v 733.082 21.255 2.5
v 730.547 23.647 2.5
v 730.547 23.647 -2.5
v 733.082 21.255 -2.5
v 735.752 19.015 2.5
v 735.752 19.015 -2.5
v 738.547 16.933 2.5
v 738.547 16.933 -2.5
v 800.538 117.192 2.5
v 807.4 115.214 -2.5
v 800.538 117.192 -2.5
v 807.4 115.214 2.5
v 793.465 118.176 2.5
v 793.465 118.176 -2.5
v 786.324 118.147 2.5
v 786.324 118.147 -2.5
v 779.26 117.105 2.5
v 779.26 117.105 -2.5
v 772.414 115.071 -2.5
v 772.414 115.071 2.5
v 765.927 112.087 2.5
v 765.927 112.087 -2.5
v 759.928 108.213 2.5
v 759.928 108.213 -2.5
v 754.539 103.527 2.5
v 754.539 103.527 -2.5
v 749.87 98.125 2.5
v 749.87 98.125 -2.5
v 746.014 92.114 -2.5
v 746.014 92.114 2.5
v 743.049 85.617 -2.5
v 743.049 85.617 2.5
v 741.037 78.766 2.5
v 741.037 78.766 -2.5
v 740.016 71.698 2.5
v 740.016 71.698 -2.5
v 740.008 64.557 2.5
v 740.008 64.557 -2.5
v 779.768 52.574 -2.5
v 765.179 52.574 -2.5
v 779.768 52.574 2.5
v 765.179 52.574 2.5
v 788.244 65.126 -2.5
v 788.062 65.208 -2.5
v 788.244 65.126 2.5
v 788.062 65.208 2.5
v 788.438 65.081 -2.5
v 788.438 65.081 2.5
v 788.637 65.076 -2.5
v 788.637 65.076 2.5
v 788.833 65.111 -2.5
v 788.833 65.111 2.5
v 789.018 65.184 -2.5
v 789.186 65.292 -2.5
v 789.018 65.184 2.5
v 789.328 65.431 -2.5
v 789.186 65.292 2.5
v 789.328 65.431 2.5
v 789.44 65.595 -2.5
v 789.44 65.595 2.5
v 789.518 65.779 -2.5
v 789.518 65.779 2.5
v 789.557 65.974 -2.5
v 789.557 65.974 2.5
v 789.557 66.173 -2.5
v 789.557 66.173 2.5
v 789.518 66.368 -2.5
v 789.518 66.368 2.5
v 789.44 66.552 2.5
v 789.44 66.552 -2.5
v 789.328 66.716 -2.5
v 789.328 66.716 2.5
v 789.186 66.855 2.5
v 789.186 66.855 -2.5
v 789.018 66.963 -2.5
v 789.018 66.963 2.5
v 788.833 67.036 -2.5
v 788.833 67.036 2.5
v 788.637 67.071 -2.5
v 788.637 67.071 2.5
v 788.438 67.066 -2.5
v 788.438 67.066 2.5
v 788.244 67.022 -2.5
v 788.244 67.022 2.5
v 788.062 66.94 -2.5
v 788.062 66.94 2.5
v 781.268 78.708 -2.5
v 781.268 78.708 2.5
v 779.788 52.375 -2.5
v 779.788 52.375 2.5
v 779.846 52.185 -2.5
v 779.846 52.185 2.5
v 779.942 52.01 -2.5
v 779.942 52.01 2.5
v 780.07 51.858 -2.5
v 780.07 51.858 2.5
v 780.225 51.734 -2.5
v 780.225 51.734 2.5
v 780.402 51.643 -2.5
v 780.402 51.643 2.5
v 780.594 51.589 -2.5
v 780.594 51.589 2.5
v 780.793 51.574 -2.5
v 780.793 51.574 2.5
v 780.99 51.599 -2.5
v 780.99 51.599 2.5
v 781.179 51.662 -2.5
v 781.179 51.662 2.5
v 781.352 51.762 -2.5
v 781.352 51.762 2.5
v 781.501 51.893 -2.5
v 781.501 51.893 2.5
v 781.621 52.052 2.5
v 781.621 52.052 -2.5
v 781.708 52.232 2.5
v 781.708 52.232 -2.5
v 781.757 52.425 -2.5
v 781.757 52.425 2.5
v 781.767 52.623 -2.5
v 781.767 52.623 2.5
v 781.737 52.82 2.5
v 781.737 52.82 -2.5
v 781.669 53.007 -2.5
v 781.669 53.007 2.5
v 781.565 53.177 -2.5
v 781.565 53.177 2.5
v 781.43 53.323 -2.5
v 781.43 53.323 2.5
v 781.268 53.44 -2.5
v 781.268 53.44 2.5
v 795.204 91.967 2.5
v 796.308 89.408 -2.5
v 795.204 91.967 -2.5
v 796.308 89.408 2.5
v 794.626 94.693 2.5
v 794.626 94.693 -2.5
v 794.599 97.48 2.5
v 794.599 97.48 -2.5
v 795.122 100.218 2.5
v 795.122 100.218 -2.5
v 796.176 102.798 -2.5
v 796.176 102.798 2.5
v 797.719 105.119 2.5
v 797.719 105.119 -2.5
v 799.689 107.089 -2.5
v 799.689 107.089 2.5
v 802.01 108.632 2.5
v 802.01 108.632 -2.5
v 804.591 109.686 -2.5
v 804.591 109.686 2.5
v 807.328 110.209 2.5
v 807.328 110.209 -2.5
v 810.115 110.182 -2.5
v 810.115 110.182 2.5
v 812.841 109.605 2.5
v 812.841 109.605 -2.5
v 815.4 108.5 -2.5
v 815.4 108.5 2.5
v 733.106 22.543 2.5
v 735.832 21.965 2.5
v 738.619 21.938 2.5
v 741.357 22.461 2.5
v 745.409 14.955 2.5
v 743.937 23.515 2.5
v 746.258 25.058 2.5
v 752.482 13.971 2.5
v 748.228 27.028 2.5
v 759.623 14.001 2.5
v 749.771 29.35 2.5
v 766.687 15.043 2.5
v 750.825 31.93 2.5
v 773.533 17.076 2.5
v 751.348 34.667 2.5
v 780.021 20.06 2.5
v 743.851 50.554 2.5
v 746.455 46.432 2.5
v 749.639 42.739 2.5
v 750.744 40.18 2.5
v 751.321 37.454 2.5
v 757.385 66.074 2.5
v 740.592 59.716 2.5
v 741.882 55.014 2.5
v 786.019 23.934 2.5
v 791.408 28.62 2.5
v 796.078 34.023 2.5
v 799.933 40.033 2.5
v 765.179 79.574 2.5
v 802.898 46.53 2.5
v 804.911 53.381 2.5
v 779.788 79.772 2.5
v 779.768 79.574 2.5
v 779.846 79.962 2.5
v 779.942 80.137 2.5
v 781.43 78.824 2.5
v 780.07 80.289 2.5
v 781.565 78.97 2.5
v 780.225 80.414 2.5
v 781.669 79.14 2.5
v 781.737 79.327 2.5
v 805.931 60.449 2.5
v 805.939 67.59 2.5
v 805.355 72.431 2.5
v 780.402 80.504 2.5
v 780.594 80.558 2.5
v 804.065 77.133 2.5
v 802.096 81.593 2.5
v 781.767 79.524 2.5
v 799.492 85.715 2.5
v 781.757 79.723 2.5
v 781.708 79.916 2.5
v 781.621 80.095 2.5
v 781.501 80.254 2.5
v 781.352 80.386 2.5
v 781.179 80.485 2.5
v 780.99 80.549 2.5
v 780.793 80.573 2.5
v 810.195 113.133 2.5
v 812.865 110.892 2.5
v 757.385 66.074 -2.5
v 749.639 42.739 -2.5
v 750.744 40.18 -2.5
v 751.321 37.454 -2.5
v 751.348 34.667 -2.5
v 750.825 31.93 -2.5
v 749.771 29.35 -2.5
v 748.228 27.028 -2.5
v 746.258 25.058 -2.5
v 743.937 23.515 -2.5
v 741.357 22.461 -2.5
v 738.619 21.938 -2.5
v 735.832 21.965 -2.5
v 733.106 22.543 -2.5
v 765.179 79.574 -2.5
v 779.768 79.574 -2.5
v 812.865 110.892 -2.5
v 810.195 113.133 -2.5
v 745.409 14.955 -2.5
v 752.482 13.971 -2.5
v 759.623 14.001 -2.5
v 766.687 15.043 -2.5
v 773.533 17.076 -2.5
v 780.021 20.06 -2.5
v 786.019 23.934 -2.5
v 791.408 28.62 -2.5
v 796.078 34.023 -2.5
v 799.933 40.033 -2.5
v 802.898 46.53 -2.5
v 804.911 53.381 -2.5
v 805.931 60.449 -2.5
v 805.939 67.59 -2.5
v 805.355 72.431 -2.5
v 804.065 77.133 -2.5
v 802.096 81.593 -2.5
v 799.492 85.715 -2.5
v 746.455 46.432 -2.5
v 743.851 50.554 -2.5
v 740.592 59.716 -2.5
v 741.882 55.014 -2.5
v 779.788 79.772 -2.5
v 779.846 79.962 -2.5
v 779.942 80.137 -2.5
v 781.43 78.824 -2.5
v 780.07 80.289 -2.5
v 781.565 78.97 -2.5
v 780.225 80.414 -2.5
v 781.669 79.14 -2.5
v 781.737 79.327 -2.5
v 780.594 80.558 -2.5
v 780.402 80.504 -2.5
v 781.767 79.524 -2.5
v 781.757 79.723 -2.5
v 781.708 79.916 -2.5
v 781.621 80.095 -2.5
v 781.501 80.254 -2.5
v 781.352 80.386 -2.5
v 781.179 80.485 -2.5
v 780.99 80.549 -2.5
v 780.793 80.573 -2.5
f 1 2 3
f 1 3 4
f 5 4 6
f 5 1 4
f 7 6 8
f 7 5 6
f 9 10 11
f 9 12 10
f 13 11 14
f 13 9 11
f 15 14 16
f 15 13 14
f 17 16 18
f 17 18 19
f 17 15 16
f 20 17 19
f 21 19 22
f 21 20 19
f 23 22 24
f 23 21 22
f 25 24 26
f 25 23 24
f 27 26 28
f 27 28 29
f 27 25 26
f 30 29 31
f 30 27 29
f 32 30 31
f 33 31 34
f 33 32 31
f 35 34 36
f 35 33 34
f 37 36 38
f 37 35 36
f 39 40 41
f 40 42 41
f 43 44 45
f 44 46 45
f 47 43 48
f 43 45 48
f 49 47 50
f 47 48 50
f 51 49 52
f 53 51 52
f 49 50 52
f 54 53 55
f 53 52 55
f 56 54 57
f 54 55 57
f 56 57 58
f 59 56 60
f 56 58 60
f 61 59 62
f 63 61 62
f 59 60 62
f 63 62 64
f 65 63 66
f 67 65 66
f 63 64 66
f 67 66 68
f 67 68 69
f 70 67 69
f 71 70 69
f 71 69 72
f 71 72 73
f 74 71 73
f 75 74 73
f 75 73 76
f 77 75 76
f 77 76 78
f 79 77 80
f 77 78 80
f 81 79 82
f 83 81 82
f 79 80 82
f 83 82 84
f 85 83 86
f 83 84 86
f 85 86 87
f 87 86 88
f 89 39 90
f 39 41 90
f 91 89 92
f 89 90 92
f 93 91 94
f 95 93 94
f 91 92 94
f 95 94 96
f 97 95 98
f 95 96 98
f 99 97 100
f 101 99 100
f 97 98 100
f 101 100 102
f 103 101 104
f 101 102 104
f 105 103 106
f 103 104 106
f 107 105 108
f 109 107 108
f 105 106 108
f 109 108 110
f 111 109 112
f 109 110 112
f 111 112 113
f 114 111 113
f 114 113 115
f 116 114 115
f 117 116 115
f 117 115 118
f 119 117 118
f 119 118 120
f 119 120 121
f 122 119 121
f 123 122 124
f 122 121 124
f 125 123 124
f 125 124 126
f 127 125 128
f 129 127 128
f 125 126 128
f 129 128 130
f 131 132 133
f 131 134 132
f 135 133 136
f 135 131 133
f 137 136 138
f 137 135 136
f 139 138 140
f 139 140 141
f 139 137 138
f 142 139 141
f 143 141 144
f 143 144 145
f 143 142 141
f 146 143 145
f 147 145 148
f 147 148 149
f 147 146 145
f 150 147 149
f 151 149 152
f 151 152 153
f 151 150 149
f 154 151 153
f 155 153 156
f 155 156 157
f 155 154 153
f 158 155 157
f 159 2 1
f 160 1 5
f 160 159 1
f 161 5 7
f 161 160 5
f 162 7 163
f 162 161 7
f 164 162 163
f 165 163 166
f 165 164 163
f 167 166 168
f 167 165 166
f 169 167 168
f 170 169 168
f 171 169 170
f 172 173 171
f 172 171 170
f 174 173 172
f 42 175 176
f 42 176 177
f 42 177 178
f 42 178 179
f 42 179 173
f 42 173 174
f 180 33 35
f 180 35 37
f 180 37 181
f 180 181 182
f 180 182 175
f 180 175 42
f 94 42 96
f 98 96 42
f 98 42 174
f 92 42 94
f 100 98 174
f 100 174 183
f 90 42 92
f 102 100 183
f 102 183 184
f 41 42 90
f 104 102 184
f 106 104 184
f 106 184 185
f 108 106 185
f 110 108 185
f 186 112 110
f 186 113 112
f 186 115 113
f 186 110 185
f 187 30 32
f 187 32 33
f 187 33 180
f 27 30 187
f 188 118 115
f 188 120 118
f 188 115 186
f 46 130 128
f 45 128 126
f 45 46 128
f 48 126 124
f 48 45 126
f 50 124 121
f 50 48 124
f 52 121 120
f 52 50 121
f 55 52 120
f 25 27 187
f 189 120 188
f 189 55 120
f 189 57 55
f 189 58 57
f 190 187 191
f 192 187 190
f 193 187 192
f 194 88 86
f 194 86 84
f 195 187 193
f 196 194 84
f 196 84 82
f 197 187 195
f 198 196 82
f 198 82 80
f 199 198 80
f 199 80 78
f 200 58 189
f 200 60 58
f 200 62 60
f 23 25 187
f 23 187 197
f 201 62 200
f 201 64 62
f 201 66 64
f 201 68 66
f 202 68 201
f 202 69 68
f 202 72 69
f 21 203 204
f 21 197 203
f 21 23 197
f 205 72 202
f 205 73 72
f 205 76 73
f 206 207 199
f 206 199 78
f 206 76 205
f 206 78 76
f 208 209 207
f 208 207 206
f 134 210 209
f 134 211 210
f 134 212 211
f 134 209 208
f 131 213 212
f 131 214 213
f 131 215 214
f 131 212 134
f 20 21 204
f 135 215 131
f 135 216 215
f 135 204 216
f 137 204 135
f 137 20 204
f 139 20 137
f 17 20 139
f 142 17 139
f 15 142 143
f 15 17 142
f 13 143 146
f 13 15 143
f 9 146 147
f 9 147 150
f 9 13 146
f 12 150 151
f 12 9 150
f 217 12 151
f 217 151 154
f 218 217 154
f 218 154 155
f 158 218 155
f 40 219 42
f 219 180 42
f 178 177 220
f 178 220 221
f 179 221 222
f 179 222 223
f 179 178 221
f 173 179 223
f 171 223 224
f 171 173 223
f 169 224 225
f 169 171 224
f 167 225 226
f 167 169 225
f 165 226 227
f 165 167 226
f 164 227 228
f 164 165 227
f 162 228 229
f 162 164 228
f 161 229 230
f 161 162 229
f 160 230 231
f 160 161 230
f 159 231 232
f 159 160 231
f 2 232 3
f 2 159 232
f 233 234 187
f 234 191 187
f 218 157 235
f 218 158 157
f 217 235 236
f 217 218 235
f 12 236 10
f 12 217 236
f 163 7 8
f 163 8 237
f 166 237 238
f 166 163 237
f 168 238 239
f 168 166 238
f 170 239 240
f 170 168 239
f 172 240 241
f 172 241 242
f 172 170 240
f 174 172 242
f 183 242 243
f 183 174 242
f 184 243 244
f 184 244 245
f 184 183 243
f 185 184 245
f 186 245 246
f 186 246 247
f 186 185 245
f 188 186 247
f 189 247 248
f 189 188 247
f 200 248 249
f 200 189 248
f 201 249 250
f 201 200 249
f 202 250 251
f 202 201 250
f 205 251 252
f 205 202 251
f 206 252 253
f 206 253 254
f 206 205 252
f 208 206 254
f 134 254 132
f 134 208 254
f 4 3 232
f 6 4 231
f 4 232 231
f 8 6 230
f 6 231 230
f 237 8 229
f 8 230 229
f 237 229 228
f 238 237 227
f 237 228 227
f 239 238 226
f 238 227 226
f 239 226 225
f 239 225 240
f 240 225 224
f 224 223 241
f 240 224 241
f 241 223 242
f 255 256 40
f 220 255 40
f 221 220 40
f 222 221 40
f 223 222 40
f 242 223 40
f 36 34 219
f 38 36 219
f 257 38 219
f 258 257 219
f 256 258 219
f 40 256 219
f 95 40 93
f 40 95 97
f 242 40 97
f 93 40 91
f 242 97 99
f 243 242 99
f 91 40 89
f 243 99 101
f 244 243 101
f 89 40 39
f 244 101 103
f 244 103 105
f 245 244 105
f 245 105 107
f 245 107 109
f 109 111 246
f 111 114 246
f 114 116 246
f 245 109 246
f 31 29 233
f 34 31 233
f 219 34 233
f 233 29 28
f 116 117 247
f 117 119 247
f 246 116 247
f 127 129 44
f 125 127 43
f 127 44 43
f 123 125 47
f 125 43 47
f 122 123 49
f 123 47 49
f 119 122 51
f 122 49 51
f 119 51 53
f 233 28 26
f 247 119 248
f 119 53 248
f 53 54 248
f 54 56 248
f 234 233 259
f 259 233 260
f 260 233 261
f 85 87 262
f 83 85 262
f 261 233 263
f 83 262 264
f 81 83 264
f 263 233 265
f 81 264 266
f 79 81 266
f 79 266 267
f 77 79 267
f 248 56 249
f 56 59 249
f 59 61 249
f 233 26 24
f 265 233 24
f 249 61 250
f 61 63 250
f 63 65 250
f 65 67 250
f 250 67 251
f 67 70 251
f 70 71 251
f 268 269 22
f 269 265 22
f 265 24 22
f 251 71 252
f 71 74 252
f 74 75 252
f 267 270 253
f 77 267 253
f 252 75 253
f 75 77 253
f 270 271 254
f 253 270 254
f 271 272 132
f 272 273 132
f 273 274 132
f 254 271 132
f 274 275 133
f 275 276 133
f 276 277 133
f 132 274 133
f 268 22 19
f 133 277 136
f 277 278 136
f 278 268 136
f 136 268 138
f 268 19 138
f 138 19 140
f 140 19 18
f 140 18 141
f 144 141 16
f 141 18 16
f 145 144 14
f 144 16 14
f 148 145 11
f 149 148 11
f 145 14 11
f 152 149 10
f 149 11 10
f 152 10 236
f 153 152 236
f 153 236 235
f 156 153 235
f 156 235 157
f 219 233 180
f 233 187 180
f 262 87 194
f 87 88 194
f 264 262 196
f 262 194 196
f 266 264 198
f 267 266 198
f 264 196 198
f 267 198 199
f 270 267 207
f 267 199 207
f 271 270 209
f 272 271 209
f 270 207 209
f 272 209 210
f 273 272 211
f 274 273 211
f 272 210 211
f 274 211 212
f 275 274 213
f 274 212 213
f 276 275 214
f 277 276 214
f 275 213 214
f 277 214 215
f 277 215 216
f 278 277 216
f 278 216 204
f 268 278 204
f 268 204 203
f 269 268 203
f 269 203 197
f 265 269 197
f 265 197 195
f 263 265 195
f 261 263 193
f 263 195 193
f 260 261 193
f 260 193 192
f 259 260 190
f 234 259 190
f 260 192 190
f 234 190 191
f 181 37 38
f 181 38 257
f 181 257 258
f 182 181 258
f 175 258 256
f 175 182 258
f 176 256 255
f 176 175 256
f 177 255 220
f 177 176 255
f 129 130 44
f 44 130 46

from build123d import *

# Parameters (mm, degrees)
BOSS_EXTRUDE1_DEPTH = 2.5


with BuildPart() as part:
    # Model → Boss-Extrude1 (new, symmetric)
    with BuildSketch(Plane.XY):
        with BuildLine():
            ThreePointArc((807.400029607, 115.214424851), (759.927821467, 108.213195948), (740.008452339, 64.557194238))
            ThreePointArc((740.008452339, 64.557194238), (742.783849766, 52.747710067), (749.639069353, 42.739078209))
            ThreePointArc((749.639069353, 42.739078209), (747.292156458, 25.994108012), (730.547186261, 23.647195117))
            ThreePointArc((730.547186261, 23.647195117), (734.400795358, 20.115585583), (738.547156658, 16.932779125))
            ThreePointArc((738.547156658, 16.932779125), (786.019364798, 23.934008028), (805.938733926, 67.590009739))
            ThreePointArc((805.938733926, 67.590009739), (803.163336499, 79.399493909), (796.308116912, 89.408125767))
            ThreePointArc((796.308116912, 89.408125767), (798.655029807, 106.153095964), (815.400000004, 108.500008859))
            ThreePointArc((815.400000004, 108.500008859), (811.546390907, 112.031618393), (807.400029607, 115.214424851))
        make_face()
        with BuildLine():
            Line((788.062050401, 66.939627392), (781.267821767, 78.707576584))
            ThreePointArc((781.267821767, 78.707576584), (781.267821767, 80.439627392), (779.767821767, 79.573601988))
            Line((779.767821767, 79.573601988), (765.179364498, 79.573601988))
            Line((765.179364498, 79.573601988), (757.385135864, 66.073601988))
            Line((757.385135864, 66.073601988), (765.179364498, 52.573601988))
            Line((765.179364498, 52.573601988), (779.767821767, 52.573601988))
            ThreePointArc((779.767821767, 52.573601988), (781.267821767, 51.707576584), (781.267821767, 53.439627392))
            Line((781.267821767, 53.439627392), (788.062050401, 65.207576584))
            ThreePointArc((788.062050401, 65.207576584), (789.562050401, 66.073601988), (788.062050401, 66.939627392))
        make_face(mode=Mode.SUBTRACT)
    extrude(amount=BOSS_EXTRUDE1_DEPTH, both=True)


solid = part.part
